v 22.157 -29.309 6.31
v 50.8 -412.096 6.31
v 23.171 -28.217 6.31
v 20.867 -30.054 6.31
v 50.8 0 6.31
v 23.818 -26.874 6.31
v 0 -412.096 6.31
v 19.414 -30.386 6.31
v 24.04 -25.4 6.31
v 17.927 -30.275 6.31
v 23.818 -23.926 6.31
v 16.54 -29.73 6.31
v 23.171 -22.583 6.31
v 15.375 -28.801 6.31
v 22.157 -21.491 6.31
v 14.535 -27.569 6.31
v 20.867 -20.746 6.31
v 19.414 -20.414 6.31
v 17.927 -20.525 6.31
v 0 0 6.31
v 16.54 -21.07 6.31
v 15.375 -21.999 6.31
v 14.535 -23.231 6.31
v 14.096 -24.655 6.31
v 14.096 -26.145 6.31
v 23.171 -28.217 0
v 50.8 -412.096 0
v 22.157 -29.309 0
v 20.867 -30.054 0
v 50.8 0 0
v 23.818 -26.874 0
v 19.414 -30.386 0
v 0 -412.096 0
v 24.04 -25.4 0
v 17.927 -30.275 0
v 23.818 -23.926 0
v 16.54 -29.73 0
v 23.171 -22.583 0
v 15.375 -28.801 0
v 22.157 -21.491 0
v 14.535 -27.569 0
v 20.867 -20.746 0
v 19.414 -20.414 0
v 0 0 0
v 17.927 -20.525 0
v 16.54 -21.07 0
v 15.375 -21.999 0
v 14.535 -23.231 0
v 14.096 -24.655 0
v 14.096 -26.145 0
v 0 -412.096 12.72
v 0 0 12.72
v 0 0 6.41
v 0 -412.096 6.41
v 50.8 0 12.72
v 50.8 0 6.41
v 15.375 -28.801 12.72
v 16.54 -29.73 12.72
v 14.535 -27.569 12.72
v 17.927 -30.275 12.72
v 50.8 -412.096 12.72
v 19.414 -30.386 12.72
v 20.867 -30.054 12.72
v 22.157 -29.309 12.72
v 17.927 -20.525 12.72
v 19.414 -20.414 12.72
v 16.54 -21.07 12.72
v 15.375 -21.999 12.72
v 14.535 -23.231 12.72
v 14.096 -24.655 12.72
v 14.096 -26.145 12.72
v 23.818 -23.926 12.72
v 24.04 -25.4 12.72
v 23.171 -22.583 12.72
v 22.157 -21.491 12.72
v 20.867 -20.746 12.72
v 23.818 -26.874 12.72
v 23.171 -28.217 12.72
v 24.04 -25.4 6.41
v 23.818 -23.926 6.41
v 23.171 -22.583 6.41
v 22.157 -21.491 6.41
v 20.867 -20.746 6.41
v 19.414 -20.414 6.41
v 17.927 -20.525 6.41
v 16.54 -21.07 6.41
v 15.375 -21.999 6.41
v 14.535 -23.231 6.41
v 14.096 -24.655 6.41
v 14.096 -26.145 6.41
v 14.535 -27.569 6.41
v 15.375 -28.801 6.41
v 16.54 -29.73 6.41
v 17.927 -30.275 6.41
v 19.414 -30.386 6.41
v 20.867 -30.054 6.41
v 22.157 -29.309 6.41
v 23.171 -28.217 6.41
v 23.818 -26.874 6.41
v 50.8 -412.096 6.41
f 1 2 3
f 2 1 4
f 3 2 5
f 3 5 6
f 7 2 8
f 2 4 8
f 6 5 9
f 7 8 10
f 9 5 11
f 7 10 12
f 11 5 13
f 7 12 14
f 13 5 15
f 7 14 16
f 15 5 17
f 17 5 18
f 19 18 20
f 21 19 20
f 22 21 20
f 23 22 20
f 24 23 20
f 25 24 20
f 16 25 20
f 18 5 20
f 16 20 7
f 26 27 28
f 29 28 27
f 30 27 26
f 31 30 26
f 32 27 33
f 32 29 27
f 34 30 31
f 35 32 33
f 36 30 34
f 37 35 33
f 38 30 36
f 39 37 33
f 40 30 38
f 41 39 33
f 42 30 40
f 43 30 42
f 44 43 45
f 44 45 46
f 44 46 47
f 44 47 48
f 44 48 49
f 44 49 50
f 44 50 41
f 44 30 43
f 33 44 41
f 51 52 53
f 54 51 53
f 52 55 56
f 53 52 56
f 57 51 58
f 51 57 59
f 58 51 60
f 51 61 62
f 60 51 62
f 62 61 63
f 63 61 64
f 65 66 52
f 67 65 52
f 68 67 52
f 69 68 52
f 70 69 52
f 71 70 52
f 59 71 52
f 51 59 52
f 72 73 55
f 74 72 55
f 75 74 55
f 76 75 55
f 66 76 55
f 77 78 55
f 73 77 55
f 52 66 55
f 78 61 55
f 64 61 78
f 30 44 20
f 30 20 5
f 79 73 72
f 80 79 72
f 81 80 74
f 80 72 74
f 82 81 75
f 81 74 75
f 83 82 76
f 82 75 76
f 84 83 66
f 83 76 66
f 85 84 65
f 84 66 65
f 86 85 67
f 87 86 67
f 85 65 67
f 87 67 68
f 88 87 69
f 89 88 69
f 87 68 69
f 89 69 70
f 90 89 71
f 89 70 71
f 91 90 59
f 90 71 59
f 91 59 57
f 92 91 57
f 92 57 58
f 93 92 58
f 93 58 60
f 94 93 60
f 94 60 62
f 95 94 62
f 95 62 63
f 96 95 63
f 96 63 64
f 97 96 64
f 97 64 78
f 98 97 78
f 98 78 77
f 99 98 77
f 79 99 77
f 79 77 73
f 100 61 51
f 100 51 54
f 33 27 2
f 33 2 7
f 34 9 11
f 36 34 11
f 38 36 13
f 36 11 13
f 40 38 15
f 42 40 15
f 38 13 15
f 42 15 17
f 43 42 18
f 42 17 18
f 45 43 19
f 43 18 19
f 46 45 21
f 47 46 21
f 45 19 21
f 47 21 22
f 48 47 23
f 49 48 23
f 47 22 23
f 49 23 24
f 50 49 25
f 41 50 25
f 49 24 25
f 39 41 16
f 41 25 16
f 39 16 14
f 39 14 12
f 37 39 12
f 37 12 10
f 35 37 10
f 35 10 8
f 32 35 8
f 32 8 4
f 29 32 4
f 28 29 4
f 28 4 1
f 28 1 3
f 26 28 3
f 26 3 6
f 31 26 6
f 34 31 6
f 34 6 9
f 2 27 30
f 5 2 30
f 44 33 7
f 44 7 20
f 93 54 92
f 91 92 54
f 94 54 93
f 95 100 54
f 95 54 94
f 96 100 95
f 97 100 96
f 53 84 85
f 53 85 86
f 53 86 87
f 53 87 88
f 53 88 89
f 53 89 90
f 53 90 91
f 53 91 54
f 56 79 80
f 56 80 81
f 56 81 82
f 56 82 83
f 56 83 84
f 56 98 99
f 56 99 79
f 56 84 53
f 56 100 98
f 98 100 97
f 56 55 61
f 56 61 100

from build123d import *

# Parameters (mm, degrees)
SALIENTE_EXTRUIR1_DEPTH = 6.31
CROQUIS3_W              = 6.31
CROQUIS3_H              = 412.09566061
SALIENTE_EXTRUIR2_DEPTH = 50.8
CROQUIS4_R              = 5
CORTAR_EXTRUIR1_DEPTH   = 31


with BuildPart() as part:
    # Croquis2 → Saliente-Extruir1 (new body)
    with BuildSketch(Plane.XY):
        Polygon((0, 0), (50.8, 0), (50.8, -361.29566061), (50.8, -412.09566061), (0, -412.09566061), align=None)
    extrude(amount=SALIENTE_EXTRUIR1_DEPTH)


with BuildPart() as body_2:
    # Croquis3 → Saliente-Extruir2 (new body)
    with BuildSketch(Plane(origin=(50.8, 0, 0), x_dir=(0, 0, -1), z_dir=(1, 0, 0))):
        with Locations((-9.565, -206.047830305)):
            Rectangle(CROQUIS3_W, CROQUIS3_H)
    extrude(amount=-SALIENTE_EXTRUIR2_DEPTH)


with BuildPart() as cortar_extruir1_tool:
    # Croquis4 → Cortar-Extruir1 (new body)
    with BuildSketch(Plane.XY.offset(12.72)):
        with Locations((19.04, -25.4)):
            Circle(CROQUIS4_R)
    extrude(amount=-CORTAR_EXTRUIR1_DEPTH)


with BuildPart() as part_1:
    add(part.part)

    # Cortar-Extruir1: cut by cortar_extruir1_tool
    add(cortar_extruir1_tool.part, mode=Mode.SUBTRACT)


with BuildPart() as body_2_1:
    add(body_2.part)

    # Cortar-Extruir1: cut by cortar_extruir1_tool
    add(cortar_extruir1_tool.part, mode=Mode.SUBTRACT)


solid = Compound([part_1.part, body_2_1.part])
